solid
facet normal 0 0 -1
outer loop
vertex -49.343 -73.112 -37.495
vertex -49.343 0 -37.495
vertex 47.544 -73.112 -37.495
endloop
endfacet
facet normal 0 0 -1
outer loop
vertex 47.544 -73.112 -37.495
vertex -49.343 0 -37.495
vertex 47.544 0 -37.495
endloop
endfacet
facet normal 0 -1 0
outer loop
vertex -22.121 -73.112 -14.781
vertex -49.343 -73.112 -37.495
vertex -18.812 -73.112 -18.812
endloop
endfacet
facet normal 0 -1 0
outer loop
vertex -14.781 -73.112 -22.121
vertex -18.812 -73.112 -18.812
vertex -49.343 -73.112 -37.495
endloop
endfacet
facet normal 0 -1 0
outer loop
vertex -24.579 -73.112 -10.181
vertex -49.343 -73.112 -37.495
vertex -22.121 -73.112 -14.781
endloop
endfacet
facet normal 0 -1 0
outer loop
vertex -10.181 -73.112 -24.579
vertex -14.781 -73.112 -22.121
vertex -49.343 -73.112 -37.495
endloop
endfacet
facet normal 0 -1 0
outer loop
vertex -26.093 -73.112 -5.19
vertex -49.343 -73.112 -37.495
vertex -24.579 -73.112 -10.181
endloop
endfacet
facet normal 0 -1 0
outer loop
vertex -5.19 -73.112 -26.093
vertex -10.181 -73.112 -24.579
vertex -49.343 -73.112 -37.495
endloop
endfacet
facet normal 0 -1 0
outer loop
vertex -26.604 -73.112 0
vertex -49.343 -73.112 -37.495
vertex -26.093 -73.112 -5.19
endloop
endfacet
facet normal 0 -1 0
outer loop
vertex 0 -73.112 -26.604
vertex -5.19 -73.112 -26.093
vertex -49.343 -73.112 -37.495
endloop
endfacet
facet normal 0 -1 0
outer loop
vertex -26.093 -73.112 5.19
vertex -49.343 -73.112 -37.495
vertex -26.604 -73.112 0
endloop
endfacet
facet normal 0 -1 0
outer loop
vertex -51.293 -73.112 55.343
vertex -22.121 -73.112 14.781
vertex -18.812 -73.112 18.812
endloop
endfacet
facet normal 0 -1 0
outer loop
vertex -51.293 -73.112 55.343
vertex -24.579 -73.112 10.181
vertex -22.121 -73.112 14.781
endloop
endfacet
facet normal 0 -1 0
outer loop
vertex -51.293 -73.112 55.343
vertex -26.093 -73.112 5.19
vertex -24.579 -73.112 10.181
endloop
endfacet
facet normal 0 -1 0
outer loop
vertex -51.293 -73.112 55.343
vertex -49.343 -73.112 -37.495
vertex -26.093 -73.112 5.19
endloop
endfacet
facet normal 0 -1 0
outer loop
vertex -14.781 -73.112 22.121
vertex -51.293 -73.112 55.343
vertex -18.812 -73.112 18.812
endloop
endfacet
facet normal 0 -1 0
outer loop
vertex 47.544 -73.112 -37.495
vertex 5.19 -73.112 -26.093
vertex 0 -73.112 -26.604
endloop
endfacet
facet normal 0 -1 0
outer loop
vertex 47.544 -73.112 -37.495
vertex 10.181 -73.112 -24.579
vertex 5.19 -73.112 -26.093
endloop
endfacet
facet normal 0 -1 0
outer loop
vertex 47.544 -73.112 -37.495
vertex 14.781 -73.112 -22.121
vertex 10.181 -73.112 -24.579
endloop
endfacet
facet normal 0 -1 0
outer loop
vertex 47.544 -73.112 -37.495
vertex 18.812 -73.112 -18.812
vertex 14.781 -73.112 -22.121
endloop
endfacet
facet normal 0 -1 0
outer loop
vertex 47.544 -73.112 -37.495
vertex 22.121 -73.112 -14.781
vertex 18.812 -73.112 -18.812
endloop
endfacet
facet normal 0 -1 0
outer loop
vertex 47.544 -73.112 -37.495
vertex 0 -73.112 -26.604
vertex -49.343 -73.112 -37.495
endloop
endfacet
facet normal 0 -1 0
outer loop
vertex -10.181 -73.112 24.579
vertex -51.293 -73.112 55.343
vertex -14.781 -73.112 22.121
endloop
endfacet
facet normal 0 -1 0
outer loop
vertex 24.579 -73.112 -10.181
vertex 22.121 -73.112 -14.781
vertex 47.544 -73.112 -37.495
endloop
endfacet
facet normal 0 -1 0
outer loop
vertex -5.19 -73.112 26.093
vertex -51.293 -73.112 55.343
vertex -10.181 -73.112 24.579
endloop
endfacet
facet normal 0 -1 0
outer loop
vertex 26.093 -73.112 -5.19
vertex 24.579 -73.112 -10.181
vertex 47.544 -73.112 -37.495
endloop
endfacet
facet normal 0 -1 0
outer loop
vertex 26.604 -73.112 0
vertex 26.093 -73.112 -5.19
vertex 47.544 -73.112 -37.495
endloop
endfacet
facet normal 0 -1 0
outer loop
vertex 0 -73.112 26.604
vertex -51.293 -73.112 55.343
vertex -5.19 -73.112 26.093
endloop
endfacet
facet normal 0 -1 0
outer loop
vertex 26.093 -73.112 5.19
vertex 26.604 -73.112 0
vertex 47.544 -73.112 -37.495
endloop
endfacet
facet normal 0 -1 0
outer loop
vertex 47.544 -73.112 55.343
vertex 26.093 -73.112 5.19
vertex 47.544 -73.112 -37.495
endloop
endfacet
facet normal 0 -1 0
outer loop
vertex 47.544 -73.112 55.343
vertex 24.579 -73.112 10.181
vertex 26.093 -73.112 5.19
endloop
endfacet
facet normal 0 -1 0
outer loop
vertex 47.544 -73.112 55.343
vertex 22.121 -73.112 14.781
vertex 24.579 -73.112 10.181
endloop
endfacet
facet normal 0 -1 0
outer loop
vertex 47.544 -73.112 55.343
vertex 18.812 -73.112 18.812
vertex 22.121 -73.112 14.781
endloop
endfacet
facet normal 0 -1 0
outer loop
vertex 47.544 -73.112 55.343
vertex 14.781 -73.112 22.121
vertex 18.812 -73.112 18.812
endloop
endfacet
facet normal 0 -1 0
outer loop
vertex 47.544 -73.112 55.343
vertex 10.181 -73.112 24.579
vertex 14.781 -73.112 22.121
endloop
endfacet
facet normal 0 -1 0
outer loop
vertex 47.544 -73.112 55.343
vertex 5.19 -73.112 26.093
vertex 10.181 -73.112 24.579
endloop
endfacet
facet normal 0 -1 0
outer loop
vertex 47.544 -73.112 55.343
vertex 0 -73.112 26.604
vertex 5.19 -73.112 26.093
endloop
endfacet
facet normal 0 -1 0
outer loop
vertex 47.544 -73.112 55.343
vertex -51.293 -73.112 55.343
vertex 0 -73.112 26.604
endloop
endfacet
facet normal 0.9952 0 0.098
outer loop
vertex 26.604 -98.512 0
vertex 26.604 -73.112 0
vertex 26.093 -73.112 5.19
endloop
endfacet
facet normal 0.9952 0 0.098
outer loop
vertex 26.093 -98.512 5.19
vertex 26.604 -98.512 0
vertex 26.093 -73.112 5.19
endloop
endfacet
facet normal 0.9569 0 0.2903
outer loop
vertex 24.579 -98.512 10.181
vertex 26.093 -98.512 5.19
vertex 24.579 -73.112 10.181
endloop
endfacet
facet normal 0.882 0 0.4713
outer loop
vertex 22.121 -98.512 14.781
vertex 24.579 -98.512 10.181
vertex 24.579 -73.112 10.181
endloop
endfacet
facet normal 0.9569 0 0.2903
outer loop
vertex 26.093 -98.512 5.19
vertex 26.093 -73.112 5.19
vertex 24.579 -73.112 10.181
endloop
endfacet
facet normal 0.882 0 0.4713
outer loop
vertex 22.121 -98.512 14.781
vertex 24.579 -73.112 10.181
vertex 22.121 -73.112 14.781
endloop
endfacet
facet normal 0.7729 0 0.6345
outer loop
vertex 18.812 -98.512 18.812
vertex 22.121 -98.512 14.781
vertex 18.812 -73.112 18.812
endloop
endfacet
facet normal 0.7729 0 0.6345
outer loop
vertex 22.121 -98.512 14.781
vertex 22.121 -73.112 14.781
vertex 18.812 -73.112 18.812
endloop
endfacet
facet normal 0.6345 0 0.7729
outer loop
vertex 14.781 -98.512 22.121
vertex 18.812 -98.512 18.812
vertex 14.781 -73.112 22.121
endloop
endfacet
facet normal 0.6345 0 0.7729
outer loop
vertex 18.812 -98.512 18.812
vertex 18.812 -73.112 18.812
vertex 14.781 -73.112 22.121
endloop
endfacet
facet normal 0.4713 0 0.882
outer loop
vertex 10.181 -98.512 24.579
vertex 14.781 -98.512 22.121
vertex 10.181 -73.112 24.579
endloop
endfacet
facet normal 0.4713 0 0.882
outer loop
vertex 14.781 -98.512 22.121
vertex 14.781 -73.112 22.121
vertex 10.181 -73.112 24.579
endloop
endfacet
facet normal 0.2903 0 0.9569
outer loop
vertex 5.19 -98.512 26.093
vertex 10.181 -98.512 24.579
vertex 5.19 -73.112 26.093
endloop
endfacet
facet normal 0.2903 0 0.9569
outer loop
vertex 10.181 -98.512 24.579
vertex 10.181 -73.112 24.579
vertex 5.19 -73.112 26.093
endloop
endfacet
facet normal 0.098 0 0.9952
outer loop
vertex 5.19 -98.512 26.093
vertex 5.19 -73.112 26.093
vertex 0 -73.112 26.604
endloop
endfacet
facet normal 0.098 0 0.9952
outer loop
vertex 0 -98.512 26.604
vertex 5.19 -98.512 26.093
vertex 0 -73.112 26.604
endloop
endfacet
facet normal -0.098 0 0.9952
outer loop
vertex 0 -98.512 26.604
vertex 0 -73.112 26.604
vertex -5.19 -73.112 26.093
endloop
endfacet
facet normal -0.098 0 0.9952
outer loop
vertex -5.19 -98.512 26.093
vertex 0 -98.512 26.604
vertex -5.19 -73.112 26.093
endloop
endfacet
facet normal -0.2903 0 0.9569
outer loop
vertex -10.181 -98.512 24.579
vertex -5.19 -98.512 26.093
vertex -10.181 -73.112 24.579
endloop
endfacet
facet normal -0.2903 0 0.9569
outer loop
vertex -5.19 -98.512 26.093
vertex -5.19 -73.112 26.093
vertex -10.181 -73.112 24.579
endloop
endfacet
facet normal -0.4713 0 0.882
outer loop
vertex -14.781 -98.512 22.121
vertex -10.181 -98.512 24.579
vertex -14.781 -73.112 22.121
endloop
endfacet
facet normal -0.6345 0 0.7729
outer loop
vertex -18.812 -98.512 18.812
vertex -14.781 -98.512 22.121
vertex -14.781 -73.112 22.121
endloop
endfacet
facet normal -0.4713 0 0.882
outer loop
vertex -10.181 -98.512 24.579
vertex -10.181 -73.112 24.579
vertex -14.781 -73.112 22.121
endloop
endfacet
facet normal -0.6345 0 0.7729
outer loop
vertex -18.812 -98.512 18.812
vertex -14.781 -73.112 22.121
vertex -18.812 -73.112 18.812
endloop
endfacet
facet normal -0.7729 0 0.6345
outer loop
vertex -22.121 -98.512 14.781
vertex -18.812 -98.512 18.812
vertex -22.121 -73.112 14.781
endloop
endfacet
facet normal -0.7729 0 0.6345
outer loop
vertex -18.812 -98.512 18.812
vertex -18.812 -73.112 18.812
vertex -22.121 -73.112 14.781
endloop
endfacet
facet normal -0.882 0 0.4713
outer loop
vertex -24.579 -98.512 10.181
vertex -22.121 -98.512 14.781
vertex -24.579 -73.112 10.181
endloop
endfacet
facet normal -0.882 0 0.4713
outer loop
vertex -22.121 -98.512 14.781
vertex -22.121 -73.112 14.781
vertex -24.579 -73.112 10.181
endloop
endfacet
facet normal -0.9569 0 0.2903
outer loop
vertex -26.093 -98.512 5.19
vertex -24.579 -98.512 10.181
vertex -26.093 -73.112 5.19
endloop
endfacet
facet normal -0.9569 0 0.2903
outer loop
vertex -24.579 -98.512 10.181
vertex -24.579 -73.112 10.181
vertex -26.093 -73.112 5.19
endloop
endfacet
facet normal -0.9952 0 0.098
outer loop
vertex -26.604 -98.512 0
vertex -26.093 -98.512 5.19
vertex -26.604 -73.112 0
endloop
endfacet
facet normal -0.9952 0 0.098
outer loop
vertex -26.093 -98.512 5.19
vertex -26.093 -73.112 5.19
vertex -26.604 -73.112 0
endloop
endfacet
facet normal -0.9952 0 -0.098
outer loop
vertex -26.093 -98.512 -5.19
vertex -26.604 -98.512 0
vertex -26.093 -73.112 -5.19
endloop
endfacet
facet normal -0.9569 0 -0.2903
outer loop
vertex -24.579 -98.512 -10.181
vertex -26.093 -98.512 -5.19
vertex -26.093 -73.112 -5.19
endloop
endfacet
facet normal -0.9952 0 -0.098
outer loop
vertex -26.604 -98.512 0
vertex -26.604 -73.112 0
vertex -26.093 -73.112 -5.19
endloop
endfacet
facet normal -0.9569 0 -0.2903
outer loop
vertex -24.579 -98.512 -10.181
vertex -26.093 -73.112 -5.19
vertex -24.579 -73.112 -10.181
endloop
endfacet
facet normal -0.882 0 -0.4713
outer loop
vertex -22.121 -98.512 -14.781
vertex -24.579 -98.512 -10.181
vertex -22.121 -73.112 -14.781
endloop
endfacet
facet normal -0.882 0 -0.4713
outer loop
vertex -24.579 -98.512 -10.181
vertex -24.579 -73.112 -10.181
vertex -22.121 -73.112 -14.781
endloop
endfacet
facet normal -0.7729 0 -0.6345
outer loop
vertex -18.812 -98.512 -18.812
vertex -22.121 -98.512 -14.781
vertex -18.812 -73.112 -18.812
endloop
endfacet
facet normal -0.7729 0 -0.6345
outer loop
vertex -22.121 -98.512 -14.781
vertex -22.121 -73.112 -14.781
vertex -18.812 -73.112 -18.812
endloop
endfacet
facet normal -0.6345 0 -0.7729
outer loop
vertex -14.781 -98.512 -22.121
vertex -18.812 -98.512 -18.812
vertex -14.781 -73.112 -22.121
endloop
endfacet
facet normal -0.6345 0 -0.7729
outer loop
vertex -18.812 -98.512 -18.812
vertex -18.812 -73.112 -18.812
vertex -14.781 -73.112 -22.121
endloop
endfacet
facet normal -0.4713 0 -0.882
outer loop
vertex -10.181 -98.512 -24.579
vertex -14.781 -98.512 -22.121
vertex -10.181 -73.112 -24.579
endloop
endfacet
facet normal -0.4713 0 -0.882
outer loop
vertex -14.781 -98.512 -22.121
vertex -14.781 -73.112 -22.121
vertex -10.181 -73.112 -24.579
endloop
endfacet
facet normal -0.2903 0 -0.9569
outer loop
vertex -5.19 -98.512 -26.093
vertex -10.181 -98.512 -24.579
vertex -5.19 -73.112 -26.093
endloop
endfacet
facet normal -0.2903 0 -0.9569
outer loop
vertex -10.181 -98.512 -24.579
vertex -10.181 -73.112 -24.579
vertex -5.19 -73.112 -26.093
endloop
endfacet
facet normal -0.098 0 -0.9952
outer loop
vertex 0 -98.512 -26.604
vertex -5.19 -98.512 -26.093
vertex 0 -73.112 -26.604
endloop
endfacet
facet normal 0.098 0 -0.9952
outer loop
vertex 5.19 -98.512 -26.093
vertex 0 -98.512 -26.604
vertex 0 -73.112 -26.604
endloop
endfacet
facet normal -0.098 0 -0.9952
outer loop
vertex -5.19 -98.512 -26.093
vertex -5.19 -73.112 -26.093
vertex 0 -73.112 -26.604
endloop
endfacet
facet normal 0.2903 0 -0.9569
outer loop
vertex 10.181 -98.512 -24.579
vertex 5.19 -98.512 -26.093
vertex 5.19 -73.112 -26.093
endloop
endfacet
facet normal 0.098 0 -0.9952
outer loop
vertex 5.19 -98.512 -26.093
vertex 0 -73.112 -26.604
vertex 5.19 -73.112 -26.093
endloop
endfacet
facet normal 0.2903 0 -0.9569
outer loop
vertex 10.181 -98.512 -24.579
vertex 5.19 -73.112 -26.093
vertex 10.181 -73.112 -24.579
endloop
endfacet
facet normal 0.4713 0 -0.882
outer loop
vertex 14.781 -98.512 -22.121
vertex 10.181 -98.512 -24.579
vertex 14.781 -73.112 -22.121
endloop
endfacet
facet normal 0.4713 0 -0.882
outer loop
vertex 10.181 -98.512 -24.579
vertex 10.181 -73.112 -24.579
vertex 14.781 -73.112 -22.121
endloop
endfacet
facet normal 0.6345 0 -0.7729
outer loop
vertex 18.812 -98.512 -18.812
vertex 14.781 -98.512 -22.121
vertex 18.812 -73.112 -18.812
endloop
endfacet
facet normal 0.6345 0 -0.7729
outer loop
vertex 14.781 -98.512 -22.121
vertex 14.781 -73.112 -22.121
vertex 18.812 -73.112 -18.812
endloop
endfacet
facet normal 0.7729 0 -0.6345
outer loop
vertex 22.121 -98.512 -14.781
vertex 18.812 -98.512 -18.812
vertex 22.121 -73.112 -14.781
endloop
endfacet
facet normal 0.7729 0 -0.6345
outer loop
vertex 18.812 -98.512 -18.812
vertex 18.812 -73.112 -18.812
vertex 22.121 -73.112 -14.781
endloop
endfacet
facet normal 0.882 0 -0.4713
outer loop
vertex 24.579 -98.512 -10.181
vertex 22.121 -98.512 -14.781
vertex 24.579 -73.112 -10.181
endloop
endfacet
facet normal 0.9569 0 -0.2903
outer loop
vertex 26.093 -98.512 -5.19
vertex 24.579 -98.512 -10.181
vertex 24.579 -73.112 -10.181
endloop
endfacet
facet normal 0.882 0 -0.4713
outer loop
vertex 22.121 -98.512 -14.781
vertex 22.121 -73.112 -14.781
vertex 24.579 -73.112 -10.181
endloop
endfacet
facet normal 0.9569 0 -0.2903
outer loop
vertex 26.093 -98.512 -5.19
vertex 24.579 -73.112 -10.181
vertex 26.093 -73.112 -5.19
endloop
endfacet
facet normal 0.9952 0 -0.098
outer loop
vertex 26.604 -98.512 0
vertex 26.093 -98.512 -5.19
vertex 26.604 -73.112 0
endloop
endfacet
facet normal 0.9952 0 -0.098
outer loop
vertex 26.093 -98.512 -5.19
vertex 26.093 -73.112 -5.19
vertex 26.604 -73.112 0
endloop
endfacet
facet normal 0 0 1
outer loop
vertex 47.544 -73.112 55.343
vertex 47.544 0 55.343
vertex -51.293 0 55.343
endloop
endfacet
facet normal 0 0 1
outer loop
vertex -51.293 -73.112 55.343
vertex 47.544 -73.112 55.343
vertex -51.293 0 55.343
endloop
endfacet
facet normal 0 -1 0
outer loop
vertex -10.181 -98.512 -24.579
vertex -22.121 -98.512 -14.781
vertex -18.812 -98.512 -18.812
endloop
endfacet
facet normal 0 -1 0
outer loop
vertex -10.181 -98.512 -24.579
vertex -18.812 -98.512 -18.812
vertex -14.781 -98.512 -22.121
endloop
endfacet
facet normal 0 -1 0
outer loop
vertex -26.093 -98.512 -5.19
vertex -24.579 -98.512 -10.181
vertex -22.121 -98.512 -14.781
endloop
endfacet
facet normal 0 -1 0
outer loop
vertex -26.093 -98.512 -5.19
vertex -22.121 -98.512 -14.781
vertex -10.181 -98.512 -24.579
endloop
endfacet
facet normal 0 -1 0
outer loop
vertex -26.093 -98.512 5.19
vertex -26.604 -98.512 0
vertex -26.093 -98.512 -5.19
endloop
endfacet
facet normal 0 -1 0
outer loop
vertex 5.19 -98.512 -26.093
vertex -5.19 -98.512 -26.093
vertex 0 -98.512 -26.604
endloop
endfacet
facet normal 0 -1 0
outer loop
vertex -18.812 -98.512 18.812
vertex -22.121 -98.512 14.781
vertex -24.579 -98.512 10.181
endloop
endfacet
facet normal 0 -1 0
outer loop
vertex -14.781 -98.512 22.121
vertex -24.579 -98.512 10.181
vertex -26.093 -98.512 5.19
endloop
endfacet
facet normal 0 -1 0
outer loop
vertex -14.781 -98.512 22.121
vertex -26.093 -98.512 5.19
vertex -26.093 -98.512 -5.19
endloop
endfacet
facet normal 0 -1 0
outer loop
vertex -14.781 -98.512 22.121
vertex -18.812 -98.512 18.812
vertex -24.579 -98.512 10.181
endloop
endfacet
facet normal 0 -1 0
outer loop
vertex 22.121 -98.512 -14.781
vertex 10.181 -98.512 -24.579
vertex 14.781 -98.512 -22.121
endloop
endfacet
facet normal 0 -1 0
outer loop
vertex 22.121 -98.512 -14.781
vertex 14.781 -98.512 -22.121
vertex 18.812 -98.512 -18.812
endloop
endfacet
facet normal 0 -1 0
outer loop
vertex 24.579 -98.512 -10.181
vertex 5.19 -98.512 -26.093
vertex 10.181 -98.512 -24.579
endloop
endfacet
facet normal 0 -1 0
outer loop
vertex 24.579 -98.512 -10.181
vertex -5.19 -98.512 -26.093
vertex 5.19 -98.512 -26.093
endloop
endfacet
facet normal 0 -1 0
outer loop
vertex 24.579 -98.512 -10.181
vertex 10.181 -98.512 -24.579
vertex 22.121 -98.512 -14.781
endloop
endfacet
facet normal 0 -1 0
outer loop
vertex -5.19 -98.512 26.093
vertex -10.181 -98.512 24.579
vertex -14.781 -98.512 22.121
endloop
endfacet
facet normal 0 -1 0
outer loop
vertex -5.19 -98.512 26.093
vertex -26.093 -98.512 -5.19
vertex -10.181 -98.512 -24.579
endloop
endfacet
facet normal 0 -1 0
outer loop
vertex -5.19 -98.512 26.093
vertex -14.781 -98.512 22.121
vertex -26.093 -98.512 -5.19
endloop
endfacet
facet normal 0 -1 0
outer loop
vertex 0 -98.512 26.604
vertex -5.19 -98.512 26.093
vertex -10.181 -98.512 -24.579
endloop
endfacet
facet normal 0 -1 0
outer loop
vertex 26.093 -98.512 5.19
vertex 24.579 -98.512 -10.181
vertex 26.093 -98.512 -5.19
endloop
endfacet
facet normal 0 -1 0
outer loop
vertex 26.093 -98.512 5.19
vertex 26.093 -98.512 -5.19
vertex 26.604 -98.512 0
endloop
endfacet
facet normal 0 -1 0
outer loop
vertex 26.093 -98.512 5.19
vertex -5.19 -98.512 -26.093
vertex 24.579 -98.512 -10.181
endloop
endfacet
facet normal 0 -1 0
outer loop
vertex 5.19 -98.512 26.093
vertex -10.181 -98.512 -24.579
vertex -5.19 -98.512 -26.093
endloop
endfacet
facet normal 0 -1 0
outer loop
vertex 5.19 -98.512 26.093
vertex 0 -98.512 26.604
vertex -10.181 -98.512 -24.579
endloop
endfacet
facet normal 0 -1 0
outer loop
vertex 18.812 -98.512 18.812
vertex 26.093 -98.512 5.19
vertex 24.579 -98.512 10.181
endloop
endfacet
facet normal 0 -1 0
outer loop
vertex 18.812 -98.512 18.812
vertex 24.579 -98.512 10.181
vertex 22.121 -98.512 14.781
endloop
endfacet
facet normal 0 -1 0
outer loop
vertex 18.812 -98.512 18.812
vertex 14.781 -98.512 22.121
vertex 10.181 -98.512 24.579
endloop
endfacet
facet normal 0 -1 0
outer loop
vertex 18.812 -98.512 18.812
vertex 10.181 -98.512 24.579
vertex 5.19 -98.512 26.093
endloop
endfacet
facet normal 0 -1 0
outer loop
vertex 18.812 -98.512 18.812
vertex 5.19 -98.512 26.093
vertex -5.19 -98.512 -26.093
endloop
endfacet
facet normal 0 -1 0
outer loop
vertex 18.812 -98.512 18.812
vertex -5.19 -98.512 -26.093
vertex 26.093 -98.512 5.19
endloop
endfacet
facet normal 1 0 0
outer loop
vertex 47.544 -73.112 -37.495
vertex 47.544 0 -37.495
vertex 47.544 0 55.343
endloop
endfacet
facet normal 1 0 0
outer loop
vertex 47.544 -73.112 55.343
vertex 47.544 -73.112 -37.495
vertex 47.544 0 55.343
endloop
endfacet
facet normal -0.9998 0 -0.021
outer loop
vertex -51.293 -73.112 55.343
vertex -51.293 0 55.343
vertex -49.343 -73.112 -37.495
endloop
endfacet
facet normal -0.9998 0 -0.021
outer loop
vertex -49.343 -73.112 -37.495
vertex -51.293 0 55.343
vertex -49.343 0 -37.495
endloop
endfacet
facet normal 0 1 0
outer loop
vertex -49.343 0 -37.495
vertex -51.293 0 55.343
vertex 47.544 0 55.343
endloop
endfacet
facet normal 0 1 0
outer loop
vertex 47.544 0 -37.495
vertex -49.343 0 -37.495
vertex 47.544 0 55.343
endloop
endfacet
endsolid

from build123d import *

# Parameters (mm, degrees)
F1_DEPTH = 73.1121525168
F2_R     = 26.6044020107
F3_DEPTH = 25.4


# Not quite as in the source:
# - the program builds the solid bodies; features that only make, move or delete a surface that nothing else refers to are left out


with BuildPart() as f1:
    # F0 (on Front) → F1 (new body)
    with BuildSketch(Plane.XZ):
        Polygon((-51.2930899858, 55.3425773978), (-49.3433475494, -37.4949574471), (47.5436300039, -37.4949574471), (47.5436300039, 55.3425773978), align=None)
    extrude(amount=F1_DEPTH)

    # F2 (on face) → F3 (join)
    with BuildSketch(Plane.XZ.offset(73.1121525168)):
        Circle(F2_R)
    extrude(amount=F3_DEPTH)


solid = f1.part
